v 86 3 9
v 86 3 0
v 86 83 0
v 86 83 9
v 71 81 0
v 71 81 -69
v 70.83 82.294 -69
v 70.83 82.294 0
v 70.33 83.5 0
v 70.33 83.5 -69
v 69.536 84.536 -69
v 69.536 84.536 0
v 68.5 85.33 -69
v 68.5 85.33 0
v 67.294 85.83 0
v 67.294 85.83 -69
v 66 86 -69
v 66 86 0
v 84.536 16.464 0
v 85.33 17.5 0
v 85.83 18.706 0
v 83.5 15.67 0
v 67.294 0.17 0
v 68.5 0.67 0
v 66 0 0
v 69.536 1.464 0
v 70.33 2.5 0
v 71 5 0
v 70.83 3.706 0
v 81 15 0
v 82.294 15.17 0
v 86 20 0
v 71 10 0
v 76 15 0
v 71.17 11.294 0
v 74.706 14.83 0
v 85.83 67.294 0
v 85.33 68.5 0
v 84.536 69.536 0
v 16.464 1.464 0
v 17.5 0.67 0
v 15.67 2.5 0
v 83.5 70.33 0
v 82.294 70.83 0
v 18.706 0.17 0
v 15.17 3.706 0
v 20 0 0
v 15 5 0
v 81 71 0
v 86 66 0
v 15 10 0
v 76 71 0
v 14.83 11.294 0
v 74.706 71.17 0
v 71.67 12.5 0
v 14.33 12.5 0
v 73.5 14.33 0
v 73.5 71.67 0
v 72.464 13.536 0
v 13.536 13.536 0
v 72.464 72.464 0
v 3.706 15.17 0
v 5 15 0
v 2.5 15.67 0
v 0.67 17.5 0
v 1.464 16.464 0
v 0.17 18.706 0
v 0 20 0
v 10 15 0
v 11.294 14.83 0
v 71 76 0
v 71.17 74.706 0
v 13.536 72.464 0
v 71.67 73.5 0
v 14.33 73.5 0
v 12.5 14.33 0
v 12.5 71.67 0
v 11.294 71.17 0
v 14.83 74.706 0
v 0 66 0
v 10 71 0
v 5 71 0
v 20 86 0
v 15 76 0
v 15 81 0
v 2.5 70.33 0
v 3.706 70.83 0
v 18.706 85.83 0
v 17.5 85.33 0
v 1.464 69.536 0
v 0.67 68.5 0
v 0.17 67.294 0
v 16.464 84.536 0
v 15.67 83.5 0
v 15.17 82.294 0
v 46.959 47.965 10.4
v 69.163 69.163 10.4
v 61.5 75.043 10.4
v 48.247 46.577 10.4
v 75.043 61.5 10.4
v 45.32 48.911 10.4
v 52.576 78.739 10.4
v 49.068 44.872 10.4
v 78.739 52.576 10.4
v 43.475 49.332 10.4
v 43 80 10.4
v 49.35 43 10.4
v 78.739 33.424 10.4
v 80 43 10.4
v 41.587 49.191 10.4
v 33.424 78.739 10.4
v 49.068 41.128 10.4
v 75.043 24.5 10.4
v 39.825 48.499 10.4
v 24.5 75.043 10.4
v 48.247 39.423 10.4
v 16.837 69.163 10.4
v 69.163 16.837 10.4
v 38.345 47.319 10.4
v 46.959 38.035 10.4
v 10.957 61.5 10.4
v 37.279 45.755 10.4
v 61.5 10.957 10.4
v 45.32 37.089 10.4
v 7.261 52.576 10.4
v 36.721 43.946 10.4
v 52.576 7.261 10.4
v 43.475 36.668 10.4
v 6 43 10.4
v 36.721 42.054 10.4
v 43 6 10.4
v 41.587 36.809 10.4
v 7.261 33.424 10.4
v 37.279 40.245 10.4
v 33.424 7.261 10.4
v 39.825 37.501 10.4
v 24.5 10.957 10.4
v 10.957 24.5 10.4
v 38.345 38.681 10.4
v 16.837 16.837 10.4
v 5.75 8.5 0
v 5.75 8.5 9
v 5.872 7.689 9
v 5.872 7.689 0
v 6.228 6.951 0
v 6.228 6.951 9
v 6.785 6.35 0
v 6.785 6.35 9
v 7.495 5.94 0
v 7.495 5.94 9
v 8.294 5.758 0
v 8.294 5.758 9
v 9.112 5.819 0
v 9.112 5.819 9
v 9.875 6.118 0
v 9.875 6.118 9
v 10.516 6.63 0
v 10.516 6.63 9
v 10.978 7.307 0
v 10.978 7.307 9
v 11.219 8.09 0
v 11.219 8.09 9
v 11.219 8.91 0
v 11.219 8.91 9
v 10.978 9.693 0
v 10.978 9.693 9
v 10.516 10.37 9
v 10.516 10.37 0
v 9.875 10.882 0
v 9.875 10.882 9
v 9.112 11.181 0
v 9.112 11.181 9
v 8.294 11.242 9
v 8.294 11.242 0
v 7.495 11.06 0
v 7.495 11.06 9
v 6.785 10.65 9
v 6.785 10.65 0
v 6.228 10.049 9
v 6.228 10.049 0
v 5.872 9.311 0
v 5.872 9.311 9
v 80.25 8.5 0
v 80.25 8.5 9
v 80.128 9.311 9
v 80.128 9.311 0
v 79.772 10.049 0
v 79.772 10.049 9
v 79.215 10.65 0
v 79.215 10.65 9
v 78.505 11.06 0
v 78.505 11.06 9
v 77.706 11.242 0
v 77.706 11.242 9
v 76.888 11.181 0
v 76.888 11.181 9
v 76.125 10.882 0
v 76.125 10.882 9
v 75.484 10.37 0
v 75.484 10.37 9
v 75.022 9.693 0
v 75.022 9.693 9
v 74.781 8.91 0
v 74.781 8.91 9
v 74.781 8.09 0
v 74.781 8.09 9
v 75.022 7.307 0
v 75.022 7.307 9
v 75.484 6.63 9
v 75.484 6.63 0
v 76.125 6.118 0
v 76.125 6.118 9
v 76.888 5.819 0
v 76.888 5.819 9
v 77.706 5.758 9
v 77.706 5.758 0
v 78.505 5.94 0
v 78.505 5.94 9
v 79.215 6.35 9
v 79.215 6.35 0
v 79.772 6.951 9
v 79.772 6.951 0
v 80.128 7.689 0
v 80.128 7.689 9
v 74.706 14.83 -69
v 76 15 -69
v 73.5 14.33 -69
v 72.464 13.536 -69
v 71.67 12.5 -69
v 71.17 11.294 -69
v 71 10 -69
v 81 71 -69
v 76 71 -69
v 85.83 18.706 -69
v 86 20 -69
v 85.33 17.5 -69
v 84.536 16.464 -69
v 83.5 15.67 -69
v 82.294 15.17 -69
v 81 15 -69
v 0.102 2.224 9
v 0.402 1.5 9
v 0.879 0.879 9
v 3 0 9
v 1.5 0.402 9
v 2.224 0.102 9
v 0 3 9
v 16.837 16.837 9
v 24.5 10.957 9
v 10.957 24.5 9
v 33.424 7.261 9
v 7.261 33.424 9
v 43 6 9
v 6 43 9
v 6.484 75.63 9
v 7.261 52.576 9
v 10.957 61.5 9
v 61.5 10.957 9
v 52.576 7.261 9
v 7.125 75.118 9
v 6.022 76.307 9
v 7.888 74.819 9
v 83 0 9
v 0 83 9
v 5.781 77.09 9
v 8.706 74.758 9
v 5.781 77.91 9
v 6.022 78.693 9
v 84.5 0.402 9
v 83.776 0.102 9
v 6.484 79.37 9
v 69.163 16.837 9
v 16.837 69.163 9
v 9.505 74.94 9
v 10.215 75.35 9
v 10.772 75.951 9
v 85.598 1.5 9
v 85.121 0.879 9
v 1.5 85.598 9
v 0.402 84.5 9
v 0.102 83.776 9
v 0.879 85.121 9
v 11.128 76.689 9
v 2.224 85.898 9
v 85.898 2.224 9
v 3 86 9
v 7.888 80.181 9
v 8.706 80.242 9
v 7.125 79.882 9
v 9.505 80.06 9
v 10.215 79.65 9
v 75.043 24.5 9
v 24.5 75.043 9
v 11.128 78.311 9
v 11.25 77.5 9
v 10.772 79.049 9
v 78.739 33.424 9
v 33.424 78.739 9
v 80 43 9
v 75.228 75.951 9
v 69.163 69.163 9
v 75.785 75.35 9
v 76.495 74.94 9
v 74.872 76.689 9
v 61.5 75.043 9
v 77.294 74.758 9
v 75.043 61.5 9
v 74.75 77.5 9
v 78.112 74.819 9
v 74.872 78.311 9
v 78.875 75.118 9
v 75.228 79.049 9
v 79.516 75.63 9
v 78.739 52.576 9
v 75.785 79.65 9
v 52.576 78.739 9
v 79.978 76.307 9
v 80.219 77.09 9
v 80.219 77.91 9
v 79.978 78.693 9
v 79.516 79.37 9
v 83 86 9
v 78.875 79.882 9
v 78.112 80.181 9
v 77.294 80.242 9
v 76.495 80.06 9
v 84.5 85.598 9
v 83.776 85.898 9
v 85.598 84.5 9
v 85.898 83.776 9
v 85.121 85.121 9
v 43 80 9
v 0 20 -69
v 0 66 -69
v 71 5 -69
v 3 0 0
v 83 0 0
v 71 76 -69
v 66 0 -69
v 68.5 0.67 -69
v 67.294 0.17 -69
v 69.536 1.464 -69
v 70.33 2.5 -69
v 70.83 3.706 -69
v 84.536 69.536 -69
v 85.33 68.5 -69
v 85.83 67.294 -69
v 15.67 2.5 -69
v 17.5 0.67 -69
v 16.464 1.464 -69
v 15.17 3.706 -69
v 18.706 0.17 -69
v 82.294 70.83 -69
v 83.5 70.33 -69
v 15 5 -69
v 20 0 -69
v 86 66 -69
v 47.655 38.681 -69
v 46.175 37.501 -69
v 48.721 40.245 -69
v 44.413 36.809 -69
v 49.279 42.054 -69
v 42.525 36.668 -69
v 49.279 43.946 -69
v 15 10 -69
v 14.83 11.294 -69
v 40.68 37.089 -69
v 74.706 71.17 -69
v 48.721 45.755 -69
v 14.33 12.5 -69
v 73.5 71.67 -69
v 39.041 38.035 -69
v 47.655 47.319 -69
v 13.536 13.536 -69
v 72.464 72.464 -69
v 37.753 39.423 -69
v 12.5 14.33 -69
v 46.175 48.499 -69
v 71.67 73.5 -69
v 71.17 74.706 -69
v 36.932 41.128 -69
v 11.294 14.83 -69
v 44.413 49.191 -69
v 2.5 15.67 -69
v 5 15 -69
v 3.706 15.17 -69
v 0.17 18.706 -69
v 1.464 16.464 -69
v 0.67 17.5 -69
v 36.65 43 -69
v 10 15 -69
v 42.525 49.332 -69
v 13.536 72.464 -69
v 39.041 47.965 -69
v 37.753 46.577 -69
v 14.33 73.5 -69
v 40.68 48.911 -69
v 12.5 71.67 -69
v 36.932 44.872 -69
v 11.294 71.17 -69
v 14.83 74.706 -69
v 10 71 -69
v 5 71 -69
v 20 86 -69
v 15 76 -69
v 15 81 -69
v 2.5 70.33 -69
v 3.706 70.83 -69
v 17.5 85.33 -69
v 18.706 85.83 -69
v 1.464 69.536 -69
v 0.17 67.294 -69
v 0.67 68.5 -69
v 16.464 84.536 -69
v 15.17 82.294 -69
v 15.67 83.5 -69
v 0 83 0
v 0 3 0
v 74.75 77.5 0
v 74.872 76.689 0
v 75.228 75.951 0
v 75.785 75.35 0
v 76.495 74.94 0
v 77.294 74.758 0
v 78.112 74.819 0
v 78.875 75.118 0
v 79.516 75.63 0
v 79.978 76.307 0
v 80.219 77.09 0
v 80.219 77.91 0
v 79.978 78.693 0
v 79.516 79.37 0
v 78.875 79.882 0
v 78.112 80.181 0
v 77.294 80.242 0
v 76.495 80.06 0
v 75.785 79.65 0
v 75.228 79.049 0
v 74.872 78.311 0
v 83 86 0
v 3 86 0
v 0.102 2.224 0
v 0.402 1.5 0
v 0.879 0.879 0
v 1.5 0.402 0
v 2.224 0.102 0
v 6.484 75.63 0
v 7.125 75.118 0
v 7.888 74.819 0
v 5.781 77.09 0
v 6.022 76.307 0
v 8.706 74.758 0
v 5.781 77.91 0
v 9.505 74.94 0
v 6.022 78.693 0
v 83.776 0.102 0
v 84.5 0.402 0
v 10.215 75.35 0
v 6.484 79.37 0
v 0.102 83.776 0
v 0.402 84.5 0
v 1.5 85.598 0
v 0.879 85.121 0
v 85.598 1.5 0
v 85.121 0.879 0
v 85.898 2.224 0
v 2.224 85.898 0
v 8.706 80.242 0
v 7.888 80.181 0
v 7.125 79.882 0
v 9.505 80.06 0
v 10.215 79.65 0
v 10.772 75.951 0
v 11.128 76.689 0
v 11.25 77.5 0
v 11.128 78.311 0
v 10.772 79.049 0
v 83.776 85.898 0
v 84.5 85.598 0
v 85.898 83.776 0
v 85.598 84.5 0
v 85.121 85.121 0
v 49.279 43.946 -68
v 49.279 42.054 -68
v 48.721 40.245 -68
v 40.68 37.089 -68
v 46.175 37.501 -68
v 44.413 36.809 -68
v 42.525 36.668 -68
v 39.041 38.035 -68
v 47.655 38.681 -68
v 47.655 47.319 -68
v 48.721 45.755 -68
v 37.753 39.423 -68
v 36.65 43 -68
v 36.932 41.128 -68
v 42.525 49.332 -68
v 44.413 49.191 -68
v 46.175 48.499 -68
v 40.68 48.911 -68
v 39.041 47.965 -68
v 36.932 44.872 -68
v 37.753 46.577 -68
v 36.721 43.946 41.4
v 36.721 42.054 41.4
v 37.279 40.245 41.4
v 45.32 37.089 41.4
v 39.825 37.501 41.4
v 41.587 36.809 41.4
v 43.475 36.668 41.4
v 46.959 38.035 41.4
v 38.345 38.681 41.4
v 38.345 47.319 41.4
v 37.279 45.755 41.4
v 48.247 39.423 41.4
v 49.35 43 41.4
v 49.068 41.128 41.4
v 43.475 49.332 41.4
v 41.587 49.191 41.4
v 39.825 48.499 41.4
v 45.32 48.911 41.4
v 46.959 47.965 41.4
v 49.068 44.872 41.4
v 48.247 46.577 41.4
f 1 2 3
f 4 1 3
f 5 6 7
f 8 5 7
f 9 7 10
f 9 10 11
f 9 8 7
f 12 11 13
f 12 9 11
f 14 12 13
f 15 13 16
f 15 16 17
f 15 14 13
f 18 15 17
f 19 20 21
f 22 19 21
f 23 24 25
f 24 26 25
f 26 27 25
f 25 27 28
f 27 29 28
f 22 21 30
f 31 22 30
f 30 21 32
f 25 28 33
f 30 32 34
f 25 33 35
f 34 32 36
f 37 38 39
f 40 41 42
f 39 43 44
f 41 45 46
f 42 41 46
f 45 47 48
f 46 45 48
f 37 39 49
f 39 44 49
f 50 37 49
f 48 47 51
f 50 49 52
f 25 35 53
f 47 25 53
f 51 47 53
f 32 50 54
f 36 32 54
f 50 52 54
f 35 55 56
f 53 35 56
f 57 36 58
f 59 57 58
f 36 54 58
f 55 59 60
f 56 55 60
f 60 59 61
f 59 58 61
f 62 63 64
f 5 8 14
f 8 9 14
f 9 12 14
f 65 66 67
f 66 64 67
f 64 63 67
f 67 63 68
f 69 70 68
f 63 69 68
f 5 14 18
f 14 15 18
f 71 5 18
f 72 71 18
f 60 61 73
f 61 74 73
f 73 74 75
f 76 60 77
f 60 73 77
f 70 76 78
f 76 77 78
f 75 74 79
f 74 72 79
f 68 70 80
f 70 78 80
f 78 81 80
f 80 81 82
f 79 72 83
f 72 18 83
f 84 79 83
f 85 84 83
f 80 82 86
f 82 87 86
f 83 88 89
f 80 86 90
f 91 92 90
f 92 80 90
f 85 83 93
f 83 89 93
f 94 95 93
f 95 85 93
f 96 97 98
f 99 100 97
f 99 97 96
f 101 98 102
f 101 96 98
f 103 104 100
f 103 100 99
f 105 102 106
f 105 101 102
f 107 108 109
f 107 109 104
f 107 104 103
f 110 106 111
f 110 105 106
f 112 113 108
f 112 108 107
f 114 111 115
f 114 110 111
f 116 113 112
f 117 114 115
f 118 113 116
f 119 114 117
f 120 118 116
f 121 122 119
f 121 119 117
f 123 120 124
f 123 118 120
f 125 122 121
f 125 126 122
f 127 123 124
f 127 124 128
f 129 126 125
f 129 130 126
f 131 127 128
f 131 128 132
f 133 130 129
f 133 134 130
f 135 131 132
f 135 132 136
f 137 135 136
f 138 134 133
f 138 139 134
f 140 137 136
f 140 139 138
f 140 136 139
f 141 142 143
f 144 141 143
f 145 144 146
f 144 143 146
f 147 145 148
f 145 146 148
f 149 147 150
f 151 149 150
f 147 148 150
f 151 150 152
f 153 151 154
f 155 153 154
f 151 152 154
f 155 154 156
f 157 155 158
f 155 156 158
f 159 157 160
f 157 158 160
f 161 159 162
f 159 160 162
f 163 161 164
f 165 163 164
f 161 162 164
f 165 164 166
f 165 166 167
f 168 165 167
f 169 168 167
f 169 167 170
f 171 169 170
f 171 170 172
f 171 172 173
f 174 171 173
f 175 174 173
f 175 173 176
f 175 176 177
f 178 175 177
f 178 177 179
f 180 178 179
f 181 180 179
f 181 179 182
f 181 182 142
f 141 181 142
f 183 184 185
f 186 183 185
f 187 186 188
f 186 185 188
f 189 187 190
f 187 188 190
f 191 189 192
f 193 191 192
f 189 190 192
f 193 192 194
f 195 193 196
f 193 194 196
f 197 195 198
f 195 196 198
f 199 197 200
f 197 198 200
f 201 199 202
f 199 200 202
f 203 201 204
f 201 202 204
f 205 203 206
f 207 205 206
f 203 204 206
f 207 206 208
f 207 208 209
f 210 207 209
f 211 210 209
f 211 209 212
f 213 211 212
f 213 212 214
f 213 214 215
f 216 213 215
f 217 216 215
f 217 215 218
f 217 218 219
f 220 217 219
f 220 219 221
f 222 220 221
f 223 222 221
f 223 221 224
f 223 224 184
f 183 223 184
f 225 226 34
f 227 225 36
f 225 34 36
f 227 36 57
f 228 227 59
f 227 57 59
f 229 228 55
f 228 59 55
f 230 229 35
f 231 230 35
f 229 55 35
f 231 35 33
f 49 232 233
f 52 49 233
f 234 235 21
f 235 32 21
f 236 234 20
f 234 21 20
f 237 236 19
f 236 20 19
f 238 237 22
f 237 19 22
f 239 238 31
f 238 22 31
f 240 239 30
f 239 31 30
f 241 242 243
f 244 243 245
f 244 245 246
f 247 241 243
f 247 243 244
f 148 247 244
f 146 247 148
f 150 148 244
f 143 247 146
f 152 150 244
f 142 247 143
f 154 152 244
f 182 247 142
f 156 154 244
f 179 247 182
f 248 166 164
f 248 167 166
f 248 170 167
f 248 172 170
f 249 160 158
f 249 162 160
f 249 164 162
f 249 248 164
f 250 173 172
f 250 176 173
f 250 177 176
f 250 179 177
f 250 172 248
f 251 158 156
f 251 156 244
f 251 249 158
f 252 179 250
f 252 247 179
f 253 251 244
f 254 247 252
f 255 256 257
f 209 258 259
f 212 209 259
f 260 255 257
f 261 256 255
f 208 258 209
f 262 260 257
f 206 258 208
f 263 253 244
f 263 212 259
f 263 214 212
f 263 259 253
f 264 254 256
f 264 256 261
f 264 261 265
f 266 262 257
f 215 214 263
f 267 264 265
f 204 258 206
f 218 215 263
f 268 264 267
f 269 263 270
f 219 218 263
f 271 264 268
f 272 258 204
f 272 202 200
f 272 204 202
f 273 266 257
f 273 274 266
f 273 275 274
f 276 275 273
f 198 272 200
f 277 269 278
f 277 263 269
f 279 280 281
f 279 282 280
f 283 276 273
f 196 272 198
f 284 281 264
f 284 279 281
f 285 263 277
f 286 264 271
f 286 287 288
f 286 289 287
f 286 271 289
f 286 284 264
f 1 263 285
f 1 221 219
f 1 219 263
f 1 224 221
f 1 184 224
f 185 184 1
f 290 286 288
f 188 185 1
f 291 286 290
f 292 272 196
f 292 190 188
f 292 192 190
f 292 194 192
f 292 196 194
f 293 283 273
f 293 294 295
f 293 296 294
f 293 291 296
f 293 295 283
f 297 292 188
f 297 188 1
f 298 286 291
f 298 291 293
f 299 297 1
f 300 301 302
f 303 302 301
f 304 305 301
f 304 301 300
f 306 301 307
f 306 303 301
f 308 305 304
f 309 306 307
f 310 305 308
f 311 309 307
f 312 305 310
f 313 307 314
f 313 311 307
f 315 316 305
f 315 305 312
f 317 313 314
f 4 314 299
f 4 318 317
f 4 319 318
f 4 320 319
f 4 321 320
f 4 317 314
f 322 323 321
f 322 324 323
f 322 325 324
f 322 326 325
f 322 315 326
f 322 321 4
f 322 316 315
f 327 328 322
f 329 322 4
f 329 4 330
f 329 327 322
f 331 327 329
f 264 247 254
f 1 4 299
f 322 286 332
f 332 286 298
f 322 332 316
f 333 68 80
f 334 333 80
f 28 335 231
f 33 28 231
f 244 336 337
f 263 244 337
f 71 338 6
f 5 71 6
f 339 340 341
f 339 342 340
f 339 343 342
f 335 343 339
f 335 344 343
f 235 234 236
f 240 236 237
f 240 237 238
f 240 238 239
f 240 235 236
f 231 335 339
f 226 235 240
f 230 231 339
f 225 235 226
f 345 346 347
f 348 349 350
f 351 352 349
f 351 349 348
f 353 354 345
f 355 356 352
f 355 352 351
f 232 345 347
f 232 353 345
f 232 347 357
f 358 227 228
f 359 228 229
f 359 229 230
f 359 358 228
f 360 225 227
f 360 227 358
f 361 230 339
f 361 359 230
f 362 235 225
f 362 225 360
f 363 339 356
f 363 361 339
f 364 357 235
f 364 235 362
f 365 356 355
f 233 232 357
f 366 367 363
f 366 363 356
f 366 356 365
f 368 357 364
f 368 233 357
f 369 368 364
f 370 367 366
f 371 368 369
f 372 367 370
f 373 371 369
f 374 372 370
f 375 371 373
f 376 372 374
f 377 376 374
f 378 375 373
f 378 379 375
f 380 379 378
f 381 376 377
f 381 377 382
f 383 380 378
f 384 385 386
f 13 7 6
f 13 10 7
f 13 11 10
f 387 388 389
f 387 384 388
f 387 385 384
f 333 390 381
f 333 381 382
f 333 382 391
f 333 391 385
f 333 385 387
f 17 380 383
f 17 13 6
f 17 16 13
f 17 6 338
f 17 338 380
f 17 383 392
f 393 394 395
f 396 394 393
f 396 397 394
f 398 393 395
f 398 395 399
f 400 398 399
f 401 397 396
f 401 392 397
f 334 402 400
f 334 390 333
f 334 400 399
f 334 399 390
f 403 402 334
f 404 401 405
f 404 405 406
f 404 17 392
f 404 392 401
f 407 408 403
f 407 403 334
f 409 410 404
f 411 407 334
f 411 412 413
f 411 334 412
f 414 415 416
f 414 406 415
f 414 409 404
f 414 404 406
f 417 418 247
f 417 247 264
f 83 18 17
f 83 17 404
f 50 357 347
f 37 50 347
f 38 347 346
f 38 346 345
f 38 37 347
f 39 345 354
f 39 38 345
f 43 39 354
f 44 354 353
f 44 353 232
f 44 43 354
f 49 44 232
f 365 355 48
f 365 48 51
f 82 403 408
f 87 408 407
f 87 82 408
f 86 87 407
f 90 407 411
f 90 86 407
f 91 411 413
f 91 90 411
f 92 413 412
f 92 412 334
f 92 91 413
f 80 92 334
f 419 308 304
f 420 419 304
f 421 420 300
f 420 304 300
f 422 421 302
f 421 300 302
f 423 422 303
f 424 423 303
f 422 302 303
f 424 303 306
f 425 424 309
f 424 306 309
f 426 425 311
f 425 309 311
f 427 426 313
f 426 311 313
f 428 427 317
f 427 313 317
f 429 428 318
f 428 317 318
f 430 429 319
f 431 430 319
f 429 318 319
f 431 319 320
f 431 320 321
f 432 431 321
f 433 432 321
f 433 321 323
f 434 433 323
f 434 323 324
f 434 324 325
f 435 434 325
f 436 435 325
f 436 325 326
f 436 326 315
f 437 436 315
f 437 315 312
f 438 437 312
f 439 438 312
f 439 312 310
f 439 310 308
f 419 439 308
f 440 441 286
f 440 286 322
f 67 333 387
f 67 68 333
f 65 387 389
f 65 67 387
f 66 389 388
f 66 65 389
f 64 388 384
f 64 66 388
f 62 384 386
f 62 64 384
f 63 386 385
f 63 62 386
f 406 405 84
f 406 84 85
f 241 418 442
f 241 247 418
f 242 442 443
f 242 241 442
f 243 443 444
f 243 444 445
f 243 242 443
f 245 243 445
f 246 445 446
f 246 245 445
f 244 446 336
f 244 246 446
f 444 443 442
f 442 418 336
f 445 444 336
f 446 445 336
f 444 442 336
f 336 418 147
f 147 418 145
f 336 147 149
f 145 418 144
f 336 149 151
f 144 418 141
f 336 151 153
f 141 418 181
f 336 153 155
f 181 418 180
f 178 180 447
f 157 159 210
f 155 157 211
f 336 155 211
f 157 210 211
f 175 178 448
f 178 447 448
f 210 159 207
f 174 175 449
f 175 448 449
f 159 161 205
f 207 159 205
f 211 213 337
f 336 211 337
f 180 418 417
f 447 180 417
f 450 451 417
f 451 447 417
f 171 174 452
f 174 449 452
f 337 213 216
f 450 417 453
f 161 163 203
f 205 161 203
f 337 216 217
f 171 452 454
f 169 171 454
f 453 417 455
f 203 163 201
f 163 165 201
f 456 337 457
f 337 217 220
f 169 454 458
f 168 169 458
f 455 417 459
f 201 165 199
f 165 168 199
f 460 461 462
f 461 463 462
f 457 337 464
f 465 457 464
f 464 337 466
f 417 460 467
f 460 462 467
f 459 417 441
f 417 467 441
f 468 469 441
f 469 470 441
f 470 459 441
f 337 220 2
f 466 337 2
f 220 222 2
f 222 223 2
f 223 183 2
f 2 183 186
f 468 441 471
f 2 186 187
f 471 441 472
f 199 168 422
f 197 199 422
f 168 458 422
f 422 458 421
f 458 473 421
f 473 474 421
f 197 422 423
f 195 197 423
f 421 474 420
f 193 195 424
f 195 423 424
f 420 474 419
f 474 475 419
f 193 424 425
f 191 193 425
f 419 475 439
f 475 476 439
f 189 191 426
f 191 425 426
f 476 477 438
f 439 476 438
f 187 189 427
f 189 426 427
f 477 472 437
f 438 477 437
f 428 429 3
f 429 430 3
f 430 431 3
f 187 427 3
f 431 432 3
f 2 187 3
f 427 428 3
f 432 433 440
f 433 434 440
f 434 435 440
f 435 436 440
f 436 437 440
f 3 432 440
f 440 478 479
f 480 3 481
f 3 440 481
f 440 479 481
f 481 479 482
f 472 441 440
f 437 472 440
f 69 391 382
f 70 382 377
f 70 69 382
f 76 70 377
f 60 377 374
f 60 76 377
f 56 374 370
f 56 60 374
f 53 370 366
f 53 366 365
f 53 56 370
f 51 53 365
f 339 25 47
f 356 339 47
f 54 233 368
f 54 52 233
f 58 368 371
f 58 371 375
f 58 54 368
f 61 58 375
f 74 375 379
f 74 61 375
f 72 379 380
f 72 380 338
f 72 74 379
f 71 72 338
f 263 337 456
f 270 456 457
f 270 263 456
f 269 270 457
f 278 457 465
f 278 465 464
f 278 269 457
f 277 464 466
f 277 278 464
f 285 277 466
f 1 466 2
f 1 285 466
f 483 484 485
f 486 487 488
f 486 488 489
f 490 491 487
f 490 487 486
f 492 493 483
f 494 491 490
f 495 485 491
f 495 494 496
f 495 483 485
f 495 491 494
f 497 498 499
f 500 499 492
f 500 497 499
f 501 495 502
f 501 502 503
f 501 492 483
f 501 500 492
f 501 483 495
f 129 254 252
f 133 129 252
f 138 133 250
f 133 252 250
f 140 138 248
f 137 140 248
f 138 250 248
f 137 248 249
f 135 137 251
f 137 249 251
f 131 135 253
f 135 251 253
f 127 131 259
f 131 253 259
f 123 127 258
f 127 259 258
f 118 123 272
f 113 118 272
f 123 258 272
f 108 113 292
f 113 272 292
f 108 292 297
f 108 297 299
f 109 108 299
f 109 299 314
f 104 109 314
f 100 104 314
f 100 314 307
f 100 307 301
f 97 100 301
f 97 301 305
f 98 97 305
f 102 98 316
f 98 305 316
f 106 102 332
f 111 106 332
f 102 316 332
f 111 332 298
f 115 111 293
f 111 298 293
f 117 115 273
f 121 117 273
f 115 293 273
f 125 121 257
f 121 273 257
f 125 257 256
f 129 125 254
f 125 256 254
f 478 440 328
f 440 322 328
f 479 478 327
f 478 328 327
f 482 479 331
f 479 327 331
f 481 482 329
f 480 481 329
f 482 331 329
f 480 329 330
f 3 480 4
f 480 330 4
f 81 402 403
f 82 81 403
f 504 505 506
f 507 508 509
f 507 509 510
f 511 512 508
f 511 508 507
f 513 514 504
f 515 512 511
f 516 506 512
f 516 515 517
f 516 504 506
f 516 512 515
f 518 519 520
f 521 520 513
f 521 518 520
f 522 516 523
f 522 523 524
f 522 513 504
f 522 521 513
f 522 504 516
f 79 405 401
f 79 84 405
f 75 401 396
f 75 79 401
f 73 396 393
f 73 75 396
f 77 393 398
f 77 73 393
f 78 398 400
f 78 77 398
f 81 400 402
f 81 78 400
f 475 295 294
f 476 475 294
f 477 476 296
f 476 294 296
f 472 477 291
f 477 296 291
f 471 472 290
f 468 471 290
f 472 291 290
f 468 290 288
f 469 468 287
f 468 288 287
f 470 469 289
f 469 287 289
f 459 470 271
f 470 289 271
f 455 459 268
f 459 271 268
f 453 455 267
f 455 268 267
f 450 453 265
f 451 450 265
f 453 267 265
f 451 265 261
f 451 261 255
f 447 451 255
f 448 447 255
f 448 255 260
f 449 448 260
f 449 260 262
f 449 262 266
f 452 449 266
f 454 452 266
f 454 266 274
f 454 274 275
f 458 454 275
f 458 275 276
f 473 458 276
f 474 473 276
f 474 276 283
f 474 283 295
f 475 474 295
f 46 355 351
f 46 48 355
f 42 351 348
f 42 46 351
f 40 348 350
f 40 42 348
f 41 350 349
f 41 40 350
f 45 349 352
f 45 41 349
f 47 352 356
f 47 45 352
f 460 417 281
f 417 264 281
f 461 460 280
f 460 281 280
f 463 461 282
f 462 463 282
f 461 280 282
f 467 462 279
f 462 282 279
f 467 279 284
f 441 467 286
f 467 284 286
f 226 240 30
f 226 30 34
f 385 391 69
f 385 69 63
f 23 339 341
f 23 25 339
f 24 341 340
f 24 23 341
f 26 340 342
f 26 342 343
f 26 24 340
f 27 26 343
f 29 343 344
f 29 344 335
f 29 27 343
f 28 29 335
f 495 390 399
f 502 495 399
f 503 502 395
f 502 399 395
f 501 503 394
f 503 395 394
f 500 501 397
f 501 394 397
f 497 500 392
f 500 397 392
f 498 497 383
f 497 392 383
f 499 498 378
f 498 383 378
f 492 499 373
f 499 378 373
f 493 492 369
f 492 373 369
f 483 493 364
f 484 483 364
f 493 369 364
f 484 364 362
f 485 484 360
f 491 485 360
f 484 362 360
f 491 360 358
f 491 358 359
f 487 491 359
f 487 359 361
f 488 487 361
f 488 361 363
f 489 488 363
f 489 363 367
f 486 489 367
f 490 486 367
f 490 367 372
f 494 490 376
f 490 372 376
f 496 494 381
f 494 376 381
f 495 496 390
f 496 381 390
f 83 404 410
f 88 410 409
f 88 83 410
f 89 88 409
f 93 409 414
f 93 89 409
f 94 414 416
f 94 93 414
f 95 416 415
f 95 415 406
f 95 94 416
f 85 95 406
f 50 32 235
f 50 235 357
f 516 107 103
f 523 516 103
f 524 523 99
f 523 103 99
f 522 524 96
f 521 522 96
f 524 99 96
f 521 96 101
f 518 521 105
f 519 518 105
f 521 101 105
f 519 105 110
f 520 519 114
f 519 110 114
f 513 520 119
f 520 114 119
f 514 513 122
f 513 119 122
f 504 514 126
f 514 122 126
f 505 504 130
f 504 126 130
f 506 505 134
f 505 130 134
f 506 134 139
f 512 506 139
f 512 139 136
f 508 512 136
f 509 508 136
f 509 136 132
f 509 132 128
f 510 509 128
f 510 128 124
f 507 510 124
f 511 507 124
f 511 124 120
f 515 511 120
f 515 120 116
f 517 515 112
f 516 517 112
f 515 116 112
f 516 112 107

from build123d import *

# Parameters (mm, degrees)
SKETCH_1_W          = 86
SKETCH_1_H          = 86
EXTRUDE_1_DEPTH     = 9
SKETCH_2_W          = 86
SKETCH_2_H          = 86
EXTRUDE_2_DEPTH     = 69
SKETCH_3_R          = 37
EXTRUDE_3_DEPTH     = 1.4
SKETCH_4_R          = 6.35
EXTRUDE_4_DEPTH     = 31
SKETCH_5_R          = 2.75
CUT_EXTRUDE_1_DEPTH = 10
SKETCH_6_W          = 15
SKETCH_6_H          = 15
CUT_EXTRUDE_2_DEPTH = 69
FILLET_1_R          = 5
SKETCH_7_R          = 6.35
CUT_EXTRUDE_3_DEPTH = 1
FILLET_2_R          = 3


with BuildPart() as part:
    # 草图1 → 凸台-拉伸1 (new body)
    with BuildSketch(Plane.XY):
        with Locations((43, 43)):
            Rectangle(SKETCH_1_W, SKETCH_1_H)
    extrude(amount=EXTRUDE_1_DEPTH)

    # 草图3 → 凸台-拉伸3 (add)
    with BuildSketch(Plane.XY.offset(9)):
        with Locations(Location((43, 43, 0), (0, 0, 180))):
            Circle(SKETCH_3_R)
    extrude(amount=EXTRUDE_3_DEPTH)

    # 草图4 → 凸台-拉伸4 (add)
    with BuildSketch(Plane.XY.offset(10.4)):
        with Locations((43, 43)):
            Circle(SKETCH_4_R)
    extrude(amount=EXTRUDE_4_DEPTH)


with BuildPart() as body_2:
    # 草图2 → 凸台-拉伸2 (new body)
    with BuildSketch(Plane(origin=(0, 0, 0), x_dir=(-1, 0, 0), z_dir=(0, 0, -1))):
        with Locations((-43, 43)):
            Rectangle(SKETCH_2_W, SKETCH_2_H)
    extrude(amount=EXTRUDE_2_DEPTH)


with BuildPart() as cut_extrude_1_tool:
    # 草图5 → 切除-拉伸1 (new body)
    with BuildSketch(Plane.XY.offset(9)):
        with Locations((8.5, 77.5)):
            Circle(SKETCH_5_R)
        with Locations(Location((77.5, 77.5, 0), (0, 0, 180))):
            Circle(SKETCH_5_R)
        with Locations((77.5, 8.5)):
            Circle(SKETCH_5_R)
        with Locations(Location((8.5, 8.5, 0), (0, 0, 180))):
            Circle(SKETCH_5_R)
    extrude(amount=-CUT_EXTRUDE_1_DEPTH)


with BuildPart() as part_1:
    add(part.part)

    # 切除-拉伸1: cut by cut_extrude_1_tool
    add(cut_extrude_1_tool.part, mode=Mode.SUBTRACT)

    # 圆角2
    fillet_2_edges = [part_1.edges().sort_by_distance(p)[0] for p in [
        (0, 86, 4.5),
        (86, 86, 4.5),
        (86, 0, 4.5),
        (0, 0, 4.5),
    ]]
    fillet(fillet_2_edges, radius=FILLET_2_R)


with BuildPart() as body_2_1:
    add(body_2.part)

    # 切除-拉伸1: cut by cut_extrude_1_tool
    add(cut_extrude_1_tool.part, mode=Mode.SUBTRACT)

    # 草图6 → 切除-拉伸2 (cut)
    with BuildSketch(Plane(origin=(0, 0, -69), x_dir=(-1, 0, 0), z_dir=(0, 0, -1))):
        with Locations((-78.5, 78.5)):
            Rectangle(SKETCH_6_W, SKETCH_6_H)
        with Locations((-7.5, 78.5)):
            Rectangle(SKETCH_6_W, SKETCH_6_H)
        with Locations((-7.5, 7.5)):
            Rectangle(SKETCH_6_W, SKETCH_6_H)
        with Locations((-78.5, 7.5)):
            Rectangle(SKETCH_6_W, SKETCH_6_H)
    extrude(amount=-CUT_EXTRUDE_2_DEPTH, mode=Mode.SUBTRACT)

    # 圆角1
    fillet_1_edges = [body_2_1.edges().sort_by_distance(p)[0] for p in [
        (86, 71, -34.5),
        (71, 86, -34.5),
        (71, 71, -34.5),
        (15, 86, -34.5),
        (0, 71, -34.5),
        (15, 71, -34.5),
        (0, 15, -34.5),
        (15, 0, -34.5),
        (15, 15, -34.5),
        (71, 0, -34.5),
        (86, 15, -34.5),
        (71, 15, -34.5),
    ]]
    fillet(fillet_1_edges, radius=FILLET_1_R)

    # 草图7 → 切除-拉伸3 (cut)
    with BuildSketch(Plane(origin=(0, 0, -69), x_dir=(-1, 0, 0), z_dir=(0, 0, -1))):
        with Locations((-43, 43)):
            Circle(SKETCH_7_R)
    extrude(amount=-CUT_EXTRUDE_3_DEPTH, mode=Mode.SUBTRACT)


solid = Compound([part_1.part, body_2_1.part])
